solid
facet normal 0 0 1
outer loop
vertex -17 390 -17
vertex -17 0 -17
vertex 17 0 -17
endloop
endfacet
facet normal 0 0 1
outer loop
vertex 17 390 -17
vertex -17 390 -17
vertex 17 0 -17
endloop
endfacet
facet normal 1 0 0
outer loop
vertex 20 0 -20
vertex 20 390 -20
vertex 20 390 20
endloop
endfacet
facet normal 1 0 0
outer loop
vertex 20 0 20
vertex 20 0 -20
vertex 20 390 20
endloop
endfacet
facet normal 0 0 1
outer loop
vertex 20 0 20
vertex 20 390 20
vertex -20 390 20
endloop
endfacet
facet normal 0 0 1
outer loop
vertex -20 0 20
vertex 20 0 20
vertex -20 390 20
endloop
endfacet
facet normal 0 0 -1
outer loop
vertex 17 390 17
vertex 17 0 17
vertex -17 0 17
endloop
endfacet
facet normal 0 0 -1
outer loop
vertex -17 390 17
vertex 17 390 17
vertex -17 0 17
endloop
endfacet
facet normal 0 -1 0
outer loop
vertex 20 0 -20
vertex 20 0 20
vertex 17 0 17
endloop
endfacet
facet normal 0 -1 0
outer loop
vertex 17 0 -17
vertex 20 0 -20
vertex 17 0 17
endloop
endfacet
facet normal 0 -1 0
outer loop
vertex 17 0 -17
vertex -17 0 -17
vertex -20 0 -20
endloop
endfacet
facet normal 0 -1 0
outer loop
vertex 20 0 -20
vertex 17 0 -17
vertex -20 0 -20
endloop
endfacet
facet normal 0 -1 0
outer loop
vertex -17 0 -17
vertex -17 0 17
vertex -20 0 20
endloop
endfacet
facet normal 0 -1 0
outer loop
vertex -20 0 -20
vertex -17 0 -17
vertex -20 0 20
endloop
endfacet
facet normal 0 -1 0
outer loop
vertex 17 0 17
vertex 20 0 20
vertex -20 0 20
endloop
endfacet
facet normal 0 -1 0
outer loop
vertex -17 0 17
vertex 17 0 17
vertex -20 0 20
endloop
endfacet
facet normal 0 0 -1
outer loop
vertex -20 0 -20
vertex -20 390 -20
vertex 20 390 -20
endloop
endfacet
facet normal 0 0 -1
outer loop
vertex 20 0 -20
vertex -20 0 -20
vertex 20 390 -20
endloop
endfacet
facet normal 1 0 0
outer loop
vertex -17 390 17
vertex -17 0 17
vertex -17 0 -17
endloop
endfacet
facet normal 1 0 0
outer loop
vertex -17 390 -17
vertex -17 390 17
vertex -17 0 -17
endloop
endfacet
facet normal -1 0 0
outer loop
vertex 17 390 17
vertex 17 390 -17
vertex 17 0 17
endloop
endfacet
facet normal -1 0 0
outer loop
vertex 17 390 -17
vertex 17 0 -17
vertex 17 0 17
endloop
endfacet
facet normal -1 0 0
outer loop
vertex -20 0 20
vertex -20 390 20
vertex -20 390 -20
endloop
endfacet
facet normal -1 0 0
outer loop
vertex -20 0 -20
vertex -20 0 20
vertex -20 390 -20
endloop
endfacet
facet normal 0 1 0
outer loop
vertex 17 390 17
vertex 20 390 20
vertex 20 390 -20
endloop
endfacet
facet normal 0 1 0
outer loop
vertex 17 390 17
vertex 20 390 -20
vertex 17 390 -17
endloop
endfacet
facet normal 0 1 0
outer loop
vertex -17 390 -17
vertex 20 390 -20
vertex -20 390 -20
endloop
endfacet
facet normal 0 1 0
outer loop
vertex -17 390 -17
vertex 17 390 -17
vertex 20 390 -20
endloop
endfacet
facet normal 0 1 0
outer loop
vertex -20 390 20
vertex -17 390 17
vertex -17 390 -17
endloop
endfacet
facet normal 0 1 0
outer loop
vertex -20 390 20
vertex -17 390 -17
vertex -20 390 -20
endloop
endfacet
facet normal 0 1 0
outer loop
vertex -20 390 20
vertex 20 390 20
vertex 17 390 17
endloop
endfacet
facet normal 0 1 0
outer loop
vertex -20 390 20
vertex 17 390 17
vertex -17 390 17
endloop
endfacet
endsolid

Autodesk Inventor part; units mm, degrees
ref_plane "YZ Plane" through (0, 0, 0) normal (1, 0, 0) x (0, 1, 0)
ref_plane "XZ Plane" through (0, 0, 0) normal (0, 1, 0) x (-1, 0, 0)
ref_plane "XY Plane" through (0, 0, 0) normal (0, 0, 1) x (1, 0, 0)
sketch "Sketch1" plane through (0, 0, 0) normal (0, 1, 0) x (-1, 0, 0)
  line L0 (-20, 20) -> (20, 20)
  line L1 (20, 20) -> (20, -20)
  line L2 (20, -20) -> (-20, -20)
  line L3 (-20, -20) -> (-20, 20)
  line L4 (-20, 20) -> (20, -20) construction
  line L5 (20, 20) -> (-20, -20) construction
  line L6 (-17, 17) -> (17, 17)
  line L7 (17, 17) -> (17, -17)
  line L8 (17, -17) -> (-17, -17)
  line L9 (-17, -17) -> (-17, 17)
  line L10 (-17, 17) -> (17, -17) construction
  line L11 (17, 17) -> (-17, -17) construction
  point P0 (0, 0)
  dimension "d0" = 40
  dimension "d1" = 40
  dimension "d2" = 34
  dimension "d3" = 34
  dimension "d4" = 3
extrude "Extrusion1" add sketch "Sketch1" along normal blind 390
sketch "Sketch2" plane through (20, 0, 20) normal (1, 0, 0) x (0, 0, -1)
  point P0 (20, 0)
properties part number "Tube 40 cm"
